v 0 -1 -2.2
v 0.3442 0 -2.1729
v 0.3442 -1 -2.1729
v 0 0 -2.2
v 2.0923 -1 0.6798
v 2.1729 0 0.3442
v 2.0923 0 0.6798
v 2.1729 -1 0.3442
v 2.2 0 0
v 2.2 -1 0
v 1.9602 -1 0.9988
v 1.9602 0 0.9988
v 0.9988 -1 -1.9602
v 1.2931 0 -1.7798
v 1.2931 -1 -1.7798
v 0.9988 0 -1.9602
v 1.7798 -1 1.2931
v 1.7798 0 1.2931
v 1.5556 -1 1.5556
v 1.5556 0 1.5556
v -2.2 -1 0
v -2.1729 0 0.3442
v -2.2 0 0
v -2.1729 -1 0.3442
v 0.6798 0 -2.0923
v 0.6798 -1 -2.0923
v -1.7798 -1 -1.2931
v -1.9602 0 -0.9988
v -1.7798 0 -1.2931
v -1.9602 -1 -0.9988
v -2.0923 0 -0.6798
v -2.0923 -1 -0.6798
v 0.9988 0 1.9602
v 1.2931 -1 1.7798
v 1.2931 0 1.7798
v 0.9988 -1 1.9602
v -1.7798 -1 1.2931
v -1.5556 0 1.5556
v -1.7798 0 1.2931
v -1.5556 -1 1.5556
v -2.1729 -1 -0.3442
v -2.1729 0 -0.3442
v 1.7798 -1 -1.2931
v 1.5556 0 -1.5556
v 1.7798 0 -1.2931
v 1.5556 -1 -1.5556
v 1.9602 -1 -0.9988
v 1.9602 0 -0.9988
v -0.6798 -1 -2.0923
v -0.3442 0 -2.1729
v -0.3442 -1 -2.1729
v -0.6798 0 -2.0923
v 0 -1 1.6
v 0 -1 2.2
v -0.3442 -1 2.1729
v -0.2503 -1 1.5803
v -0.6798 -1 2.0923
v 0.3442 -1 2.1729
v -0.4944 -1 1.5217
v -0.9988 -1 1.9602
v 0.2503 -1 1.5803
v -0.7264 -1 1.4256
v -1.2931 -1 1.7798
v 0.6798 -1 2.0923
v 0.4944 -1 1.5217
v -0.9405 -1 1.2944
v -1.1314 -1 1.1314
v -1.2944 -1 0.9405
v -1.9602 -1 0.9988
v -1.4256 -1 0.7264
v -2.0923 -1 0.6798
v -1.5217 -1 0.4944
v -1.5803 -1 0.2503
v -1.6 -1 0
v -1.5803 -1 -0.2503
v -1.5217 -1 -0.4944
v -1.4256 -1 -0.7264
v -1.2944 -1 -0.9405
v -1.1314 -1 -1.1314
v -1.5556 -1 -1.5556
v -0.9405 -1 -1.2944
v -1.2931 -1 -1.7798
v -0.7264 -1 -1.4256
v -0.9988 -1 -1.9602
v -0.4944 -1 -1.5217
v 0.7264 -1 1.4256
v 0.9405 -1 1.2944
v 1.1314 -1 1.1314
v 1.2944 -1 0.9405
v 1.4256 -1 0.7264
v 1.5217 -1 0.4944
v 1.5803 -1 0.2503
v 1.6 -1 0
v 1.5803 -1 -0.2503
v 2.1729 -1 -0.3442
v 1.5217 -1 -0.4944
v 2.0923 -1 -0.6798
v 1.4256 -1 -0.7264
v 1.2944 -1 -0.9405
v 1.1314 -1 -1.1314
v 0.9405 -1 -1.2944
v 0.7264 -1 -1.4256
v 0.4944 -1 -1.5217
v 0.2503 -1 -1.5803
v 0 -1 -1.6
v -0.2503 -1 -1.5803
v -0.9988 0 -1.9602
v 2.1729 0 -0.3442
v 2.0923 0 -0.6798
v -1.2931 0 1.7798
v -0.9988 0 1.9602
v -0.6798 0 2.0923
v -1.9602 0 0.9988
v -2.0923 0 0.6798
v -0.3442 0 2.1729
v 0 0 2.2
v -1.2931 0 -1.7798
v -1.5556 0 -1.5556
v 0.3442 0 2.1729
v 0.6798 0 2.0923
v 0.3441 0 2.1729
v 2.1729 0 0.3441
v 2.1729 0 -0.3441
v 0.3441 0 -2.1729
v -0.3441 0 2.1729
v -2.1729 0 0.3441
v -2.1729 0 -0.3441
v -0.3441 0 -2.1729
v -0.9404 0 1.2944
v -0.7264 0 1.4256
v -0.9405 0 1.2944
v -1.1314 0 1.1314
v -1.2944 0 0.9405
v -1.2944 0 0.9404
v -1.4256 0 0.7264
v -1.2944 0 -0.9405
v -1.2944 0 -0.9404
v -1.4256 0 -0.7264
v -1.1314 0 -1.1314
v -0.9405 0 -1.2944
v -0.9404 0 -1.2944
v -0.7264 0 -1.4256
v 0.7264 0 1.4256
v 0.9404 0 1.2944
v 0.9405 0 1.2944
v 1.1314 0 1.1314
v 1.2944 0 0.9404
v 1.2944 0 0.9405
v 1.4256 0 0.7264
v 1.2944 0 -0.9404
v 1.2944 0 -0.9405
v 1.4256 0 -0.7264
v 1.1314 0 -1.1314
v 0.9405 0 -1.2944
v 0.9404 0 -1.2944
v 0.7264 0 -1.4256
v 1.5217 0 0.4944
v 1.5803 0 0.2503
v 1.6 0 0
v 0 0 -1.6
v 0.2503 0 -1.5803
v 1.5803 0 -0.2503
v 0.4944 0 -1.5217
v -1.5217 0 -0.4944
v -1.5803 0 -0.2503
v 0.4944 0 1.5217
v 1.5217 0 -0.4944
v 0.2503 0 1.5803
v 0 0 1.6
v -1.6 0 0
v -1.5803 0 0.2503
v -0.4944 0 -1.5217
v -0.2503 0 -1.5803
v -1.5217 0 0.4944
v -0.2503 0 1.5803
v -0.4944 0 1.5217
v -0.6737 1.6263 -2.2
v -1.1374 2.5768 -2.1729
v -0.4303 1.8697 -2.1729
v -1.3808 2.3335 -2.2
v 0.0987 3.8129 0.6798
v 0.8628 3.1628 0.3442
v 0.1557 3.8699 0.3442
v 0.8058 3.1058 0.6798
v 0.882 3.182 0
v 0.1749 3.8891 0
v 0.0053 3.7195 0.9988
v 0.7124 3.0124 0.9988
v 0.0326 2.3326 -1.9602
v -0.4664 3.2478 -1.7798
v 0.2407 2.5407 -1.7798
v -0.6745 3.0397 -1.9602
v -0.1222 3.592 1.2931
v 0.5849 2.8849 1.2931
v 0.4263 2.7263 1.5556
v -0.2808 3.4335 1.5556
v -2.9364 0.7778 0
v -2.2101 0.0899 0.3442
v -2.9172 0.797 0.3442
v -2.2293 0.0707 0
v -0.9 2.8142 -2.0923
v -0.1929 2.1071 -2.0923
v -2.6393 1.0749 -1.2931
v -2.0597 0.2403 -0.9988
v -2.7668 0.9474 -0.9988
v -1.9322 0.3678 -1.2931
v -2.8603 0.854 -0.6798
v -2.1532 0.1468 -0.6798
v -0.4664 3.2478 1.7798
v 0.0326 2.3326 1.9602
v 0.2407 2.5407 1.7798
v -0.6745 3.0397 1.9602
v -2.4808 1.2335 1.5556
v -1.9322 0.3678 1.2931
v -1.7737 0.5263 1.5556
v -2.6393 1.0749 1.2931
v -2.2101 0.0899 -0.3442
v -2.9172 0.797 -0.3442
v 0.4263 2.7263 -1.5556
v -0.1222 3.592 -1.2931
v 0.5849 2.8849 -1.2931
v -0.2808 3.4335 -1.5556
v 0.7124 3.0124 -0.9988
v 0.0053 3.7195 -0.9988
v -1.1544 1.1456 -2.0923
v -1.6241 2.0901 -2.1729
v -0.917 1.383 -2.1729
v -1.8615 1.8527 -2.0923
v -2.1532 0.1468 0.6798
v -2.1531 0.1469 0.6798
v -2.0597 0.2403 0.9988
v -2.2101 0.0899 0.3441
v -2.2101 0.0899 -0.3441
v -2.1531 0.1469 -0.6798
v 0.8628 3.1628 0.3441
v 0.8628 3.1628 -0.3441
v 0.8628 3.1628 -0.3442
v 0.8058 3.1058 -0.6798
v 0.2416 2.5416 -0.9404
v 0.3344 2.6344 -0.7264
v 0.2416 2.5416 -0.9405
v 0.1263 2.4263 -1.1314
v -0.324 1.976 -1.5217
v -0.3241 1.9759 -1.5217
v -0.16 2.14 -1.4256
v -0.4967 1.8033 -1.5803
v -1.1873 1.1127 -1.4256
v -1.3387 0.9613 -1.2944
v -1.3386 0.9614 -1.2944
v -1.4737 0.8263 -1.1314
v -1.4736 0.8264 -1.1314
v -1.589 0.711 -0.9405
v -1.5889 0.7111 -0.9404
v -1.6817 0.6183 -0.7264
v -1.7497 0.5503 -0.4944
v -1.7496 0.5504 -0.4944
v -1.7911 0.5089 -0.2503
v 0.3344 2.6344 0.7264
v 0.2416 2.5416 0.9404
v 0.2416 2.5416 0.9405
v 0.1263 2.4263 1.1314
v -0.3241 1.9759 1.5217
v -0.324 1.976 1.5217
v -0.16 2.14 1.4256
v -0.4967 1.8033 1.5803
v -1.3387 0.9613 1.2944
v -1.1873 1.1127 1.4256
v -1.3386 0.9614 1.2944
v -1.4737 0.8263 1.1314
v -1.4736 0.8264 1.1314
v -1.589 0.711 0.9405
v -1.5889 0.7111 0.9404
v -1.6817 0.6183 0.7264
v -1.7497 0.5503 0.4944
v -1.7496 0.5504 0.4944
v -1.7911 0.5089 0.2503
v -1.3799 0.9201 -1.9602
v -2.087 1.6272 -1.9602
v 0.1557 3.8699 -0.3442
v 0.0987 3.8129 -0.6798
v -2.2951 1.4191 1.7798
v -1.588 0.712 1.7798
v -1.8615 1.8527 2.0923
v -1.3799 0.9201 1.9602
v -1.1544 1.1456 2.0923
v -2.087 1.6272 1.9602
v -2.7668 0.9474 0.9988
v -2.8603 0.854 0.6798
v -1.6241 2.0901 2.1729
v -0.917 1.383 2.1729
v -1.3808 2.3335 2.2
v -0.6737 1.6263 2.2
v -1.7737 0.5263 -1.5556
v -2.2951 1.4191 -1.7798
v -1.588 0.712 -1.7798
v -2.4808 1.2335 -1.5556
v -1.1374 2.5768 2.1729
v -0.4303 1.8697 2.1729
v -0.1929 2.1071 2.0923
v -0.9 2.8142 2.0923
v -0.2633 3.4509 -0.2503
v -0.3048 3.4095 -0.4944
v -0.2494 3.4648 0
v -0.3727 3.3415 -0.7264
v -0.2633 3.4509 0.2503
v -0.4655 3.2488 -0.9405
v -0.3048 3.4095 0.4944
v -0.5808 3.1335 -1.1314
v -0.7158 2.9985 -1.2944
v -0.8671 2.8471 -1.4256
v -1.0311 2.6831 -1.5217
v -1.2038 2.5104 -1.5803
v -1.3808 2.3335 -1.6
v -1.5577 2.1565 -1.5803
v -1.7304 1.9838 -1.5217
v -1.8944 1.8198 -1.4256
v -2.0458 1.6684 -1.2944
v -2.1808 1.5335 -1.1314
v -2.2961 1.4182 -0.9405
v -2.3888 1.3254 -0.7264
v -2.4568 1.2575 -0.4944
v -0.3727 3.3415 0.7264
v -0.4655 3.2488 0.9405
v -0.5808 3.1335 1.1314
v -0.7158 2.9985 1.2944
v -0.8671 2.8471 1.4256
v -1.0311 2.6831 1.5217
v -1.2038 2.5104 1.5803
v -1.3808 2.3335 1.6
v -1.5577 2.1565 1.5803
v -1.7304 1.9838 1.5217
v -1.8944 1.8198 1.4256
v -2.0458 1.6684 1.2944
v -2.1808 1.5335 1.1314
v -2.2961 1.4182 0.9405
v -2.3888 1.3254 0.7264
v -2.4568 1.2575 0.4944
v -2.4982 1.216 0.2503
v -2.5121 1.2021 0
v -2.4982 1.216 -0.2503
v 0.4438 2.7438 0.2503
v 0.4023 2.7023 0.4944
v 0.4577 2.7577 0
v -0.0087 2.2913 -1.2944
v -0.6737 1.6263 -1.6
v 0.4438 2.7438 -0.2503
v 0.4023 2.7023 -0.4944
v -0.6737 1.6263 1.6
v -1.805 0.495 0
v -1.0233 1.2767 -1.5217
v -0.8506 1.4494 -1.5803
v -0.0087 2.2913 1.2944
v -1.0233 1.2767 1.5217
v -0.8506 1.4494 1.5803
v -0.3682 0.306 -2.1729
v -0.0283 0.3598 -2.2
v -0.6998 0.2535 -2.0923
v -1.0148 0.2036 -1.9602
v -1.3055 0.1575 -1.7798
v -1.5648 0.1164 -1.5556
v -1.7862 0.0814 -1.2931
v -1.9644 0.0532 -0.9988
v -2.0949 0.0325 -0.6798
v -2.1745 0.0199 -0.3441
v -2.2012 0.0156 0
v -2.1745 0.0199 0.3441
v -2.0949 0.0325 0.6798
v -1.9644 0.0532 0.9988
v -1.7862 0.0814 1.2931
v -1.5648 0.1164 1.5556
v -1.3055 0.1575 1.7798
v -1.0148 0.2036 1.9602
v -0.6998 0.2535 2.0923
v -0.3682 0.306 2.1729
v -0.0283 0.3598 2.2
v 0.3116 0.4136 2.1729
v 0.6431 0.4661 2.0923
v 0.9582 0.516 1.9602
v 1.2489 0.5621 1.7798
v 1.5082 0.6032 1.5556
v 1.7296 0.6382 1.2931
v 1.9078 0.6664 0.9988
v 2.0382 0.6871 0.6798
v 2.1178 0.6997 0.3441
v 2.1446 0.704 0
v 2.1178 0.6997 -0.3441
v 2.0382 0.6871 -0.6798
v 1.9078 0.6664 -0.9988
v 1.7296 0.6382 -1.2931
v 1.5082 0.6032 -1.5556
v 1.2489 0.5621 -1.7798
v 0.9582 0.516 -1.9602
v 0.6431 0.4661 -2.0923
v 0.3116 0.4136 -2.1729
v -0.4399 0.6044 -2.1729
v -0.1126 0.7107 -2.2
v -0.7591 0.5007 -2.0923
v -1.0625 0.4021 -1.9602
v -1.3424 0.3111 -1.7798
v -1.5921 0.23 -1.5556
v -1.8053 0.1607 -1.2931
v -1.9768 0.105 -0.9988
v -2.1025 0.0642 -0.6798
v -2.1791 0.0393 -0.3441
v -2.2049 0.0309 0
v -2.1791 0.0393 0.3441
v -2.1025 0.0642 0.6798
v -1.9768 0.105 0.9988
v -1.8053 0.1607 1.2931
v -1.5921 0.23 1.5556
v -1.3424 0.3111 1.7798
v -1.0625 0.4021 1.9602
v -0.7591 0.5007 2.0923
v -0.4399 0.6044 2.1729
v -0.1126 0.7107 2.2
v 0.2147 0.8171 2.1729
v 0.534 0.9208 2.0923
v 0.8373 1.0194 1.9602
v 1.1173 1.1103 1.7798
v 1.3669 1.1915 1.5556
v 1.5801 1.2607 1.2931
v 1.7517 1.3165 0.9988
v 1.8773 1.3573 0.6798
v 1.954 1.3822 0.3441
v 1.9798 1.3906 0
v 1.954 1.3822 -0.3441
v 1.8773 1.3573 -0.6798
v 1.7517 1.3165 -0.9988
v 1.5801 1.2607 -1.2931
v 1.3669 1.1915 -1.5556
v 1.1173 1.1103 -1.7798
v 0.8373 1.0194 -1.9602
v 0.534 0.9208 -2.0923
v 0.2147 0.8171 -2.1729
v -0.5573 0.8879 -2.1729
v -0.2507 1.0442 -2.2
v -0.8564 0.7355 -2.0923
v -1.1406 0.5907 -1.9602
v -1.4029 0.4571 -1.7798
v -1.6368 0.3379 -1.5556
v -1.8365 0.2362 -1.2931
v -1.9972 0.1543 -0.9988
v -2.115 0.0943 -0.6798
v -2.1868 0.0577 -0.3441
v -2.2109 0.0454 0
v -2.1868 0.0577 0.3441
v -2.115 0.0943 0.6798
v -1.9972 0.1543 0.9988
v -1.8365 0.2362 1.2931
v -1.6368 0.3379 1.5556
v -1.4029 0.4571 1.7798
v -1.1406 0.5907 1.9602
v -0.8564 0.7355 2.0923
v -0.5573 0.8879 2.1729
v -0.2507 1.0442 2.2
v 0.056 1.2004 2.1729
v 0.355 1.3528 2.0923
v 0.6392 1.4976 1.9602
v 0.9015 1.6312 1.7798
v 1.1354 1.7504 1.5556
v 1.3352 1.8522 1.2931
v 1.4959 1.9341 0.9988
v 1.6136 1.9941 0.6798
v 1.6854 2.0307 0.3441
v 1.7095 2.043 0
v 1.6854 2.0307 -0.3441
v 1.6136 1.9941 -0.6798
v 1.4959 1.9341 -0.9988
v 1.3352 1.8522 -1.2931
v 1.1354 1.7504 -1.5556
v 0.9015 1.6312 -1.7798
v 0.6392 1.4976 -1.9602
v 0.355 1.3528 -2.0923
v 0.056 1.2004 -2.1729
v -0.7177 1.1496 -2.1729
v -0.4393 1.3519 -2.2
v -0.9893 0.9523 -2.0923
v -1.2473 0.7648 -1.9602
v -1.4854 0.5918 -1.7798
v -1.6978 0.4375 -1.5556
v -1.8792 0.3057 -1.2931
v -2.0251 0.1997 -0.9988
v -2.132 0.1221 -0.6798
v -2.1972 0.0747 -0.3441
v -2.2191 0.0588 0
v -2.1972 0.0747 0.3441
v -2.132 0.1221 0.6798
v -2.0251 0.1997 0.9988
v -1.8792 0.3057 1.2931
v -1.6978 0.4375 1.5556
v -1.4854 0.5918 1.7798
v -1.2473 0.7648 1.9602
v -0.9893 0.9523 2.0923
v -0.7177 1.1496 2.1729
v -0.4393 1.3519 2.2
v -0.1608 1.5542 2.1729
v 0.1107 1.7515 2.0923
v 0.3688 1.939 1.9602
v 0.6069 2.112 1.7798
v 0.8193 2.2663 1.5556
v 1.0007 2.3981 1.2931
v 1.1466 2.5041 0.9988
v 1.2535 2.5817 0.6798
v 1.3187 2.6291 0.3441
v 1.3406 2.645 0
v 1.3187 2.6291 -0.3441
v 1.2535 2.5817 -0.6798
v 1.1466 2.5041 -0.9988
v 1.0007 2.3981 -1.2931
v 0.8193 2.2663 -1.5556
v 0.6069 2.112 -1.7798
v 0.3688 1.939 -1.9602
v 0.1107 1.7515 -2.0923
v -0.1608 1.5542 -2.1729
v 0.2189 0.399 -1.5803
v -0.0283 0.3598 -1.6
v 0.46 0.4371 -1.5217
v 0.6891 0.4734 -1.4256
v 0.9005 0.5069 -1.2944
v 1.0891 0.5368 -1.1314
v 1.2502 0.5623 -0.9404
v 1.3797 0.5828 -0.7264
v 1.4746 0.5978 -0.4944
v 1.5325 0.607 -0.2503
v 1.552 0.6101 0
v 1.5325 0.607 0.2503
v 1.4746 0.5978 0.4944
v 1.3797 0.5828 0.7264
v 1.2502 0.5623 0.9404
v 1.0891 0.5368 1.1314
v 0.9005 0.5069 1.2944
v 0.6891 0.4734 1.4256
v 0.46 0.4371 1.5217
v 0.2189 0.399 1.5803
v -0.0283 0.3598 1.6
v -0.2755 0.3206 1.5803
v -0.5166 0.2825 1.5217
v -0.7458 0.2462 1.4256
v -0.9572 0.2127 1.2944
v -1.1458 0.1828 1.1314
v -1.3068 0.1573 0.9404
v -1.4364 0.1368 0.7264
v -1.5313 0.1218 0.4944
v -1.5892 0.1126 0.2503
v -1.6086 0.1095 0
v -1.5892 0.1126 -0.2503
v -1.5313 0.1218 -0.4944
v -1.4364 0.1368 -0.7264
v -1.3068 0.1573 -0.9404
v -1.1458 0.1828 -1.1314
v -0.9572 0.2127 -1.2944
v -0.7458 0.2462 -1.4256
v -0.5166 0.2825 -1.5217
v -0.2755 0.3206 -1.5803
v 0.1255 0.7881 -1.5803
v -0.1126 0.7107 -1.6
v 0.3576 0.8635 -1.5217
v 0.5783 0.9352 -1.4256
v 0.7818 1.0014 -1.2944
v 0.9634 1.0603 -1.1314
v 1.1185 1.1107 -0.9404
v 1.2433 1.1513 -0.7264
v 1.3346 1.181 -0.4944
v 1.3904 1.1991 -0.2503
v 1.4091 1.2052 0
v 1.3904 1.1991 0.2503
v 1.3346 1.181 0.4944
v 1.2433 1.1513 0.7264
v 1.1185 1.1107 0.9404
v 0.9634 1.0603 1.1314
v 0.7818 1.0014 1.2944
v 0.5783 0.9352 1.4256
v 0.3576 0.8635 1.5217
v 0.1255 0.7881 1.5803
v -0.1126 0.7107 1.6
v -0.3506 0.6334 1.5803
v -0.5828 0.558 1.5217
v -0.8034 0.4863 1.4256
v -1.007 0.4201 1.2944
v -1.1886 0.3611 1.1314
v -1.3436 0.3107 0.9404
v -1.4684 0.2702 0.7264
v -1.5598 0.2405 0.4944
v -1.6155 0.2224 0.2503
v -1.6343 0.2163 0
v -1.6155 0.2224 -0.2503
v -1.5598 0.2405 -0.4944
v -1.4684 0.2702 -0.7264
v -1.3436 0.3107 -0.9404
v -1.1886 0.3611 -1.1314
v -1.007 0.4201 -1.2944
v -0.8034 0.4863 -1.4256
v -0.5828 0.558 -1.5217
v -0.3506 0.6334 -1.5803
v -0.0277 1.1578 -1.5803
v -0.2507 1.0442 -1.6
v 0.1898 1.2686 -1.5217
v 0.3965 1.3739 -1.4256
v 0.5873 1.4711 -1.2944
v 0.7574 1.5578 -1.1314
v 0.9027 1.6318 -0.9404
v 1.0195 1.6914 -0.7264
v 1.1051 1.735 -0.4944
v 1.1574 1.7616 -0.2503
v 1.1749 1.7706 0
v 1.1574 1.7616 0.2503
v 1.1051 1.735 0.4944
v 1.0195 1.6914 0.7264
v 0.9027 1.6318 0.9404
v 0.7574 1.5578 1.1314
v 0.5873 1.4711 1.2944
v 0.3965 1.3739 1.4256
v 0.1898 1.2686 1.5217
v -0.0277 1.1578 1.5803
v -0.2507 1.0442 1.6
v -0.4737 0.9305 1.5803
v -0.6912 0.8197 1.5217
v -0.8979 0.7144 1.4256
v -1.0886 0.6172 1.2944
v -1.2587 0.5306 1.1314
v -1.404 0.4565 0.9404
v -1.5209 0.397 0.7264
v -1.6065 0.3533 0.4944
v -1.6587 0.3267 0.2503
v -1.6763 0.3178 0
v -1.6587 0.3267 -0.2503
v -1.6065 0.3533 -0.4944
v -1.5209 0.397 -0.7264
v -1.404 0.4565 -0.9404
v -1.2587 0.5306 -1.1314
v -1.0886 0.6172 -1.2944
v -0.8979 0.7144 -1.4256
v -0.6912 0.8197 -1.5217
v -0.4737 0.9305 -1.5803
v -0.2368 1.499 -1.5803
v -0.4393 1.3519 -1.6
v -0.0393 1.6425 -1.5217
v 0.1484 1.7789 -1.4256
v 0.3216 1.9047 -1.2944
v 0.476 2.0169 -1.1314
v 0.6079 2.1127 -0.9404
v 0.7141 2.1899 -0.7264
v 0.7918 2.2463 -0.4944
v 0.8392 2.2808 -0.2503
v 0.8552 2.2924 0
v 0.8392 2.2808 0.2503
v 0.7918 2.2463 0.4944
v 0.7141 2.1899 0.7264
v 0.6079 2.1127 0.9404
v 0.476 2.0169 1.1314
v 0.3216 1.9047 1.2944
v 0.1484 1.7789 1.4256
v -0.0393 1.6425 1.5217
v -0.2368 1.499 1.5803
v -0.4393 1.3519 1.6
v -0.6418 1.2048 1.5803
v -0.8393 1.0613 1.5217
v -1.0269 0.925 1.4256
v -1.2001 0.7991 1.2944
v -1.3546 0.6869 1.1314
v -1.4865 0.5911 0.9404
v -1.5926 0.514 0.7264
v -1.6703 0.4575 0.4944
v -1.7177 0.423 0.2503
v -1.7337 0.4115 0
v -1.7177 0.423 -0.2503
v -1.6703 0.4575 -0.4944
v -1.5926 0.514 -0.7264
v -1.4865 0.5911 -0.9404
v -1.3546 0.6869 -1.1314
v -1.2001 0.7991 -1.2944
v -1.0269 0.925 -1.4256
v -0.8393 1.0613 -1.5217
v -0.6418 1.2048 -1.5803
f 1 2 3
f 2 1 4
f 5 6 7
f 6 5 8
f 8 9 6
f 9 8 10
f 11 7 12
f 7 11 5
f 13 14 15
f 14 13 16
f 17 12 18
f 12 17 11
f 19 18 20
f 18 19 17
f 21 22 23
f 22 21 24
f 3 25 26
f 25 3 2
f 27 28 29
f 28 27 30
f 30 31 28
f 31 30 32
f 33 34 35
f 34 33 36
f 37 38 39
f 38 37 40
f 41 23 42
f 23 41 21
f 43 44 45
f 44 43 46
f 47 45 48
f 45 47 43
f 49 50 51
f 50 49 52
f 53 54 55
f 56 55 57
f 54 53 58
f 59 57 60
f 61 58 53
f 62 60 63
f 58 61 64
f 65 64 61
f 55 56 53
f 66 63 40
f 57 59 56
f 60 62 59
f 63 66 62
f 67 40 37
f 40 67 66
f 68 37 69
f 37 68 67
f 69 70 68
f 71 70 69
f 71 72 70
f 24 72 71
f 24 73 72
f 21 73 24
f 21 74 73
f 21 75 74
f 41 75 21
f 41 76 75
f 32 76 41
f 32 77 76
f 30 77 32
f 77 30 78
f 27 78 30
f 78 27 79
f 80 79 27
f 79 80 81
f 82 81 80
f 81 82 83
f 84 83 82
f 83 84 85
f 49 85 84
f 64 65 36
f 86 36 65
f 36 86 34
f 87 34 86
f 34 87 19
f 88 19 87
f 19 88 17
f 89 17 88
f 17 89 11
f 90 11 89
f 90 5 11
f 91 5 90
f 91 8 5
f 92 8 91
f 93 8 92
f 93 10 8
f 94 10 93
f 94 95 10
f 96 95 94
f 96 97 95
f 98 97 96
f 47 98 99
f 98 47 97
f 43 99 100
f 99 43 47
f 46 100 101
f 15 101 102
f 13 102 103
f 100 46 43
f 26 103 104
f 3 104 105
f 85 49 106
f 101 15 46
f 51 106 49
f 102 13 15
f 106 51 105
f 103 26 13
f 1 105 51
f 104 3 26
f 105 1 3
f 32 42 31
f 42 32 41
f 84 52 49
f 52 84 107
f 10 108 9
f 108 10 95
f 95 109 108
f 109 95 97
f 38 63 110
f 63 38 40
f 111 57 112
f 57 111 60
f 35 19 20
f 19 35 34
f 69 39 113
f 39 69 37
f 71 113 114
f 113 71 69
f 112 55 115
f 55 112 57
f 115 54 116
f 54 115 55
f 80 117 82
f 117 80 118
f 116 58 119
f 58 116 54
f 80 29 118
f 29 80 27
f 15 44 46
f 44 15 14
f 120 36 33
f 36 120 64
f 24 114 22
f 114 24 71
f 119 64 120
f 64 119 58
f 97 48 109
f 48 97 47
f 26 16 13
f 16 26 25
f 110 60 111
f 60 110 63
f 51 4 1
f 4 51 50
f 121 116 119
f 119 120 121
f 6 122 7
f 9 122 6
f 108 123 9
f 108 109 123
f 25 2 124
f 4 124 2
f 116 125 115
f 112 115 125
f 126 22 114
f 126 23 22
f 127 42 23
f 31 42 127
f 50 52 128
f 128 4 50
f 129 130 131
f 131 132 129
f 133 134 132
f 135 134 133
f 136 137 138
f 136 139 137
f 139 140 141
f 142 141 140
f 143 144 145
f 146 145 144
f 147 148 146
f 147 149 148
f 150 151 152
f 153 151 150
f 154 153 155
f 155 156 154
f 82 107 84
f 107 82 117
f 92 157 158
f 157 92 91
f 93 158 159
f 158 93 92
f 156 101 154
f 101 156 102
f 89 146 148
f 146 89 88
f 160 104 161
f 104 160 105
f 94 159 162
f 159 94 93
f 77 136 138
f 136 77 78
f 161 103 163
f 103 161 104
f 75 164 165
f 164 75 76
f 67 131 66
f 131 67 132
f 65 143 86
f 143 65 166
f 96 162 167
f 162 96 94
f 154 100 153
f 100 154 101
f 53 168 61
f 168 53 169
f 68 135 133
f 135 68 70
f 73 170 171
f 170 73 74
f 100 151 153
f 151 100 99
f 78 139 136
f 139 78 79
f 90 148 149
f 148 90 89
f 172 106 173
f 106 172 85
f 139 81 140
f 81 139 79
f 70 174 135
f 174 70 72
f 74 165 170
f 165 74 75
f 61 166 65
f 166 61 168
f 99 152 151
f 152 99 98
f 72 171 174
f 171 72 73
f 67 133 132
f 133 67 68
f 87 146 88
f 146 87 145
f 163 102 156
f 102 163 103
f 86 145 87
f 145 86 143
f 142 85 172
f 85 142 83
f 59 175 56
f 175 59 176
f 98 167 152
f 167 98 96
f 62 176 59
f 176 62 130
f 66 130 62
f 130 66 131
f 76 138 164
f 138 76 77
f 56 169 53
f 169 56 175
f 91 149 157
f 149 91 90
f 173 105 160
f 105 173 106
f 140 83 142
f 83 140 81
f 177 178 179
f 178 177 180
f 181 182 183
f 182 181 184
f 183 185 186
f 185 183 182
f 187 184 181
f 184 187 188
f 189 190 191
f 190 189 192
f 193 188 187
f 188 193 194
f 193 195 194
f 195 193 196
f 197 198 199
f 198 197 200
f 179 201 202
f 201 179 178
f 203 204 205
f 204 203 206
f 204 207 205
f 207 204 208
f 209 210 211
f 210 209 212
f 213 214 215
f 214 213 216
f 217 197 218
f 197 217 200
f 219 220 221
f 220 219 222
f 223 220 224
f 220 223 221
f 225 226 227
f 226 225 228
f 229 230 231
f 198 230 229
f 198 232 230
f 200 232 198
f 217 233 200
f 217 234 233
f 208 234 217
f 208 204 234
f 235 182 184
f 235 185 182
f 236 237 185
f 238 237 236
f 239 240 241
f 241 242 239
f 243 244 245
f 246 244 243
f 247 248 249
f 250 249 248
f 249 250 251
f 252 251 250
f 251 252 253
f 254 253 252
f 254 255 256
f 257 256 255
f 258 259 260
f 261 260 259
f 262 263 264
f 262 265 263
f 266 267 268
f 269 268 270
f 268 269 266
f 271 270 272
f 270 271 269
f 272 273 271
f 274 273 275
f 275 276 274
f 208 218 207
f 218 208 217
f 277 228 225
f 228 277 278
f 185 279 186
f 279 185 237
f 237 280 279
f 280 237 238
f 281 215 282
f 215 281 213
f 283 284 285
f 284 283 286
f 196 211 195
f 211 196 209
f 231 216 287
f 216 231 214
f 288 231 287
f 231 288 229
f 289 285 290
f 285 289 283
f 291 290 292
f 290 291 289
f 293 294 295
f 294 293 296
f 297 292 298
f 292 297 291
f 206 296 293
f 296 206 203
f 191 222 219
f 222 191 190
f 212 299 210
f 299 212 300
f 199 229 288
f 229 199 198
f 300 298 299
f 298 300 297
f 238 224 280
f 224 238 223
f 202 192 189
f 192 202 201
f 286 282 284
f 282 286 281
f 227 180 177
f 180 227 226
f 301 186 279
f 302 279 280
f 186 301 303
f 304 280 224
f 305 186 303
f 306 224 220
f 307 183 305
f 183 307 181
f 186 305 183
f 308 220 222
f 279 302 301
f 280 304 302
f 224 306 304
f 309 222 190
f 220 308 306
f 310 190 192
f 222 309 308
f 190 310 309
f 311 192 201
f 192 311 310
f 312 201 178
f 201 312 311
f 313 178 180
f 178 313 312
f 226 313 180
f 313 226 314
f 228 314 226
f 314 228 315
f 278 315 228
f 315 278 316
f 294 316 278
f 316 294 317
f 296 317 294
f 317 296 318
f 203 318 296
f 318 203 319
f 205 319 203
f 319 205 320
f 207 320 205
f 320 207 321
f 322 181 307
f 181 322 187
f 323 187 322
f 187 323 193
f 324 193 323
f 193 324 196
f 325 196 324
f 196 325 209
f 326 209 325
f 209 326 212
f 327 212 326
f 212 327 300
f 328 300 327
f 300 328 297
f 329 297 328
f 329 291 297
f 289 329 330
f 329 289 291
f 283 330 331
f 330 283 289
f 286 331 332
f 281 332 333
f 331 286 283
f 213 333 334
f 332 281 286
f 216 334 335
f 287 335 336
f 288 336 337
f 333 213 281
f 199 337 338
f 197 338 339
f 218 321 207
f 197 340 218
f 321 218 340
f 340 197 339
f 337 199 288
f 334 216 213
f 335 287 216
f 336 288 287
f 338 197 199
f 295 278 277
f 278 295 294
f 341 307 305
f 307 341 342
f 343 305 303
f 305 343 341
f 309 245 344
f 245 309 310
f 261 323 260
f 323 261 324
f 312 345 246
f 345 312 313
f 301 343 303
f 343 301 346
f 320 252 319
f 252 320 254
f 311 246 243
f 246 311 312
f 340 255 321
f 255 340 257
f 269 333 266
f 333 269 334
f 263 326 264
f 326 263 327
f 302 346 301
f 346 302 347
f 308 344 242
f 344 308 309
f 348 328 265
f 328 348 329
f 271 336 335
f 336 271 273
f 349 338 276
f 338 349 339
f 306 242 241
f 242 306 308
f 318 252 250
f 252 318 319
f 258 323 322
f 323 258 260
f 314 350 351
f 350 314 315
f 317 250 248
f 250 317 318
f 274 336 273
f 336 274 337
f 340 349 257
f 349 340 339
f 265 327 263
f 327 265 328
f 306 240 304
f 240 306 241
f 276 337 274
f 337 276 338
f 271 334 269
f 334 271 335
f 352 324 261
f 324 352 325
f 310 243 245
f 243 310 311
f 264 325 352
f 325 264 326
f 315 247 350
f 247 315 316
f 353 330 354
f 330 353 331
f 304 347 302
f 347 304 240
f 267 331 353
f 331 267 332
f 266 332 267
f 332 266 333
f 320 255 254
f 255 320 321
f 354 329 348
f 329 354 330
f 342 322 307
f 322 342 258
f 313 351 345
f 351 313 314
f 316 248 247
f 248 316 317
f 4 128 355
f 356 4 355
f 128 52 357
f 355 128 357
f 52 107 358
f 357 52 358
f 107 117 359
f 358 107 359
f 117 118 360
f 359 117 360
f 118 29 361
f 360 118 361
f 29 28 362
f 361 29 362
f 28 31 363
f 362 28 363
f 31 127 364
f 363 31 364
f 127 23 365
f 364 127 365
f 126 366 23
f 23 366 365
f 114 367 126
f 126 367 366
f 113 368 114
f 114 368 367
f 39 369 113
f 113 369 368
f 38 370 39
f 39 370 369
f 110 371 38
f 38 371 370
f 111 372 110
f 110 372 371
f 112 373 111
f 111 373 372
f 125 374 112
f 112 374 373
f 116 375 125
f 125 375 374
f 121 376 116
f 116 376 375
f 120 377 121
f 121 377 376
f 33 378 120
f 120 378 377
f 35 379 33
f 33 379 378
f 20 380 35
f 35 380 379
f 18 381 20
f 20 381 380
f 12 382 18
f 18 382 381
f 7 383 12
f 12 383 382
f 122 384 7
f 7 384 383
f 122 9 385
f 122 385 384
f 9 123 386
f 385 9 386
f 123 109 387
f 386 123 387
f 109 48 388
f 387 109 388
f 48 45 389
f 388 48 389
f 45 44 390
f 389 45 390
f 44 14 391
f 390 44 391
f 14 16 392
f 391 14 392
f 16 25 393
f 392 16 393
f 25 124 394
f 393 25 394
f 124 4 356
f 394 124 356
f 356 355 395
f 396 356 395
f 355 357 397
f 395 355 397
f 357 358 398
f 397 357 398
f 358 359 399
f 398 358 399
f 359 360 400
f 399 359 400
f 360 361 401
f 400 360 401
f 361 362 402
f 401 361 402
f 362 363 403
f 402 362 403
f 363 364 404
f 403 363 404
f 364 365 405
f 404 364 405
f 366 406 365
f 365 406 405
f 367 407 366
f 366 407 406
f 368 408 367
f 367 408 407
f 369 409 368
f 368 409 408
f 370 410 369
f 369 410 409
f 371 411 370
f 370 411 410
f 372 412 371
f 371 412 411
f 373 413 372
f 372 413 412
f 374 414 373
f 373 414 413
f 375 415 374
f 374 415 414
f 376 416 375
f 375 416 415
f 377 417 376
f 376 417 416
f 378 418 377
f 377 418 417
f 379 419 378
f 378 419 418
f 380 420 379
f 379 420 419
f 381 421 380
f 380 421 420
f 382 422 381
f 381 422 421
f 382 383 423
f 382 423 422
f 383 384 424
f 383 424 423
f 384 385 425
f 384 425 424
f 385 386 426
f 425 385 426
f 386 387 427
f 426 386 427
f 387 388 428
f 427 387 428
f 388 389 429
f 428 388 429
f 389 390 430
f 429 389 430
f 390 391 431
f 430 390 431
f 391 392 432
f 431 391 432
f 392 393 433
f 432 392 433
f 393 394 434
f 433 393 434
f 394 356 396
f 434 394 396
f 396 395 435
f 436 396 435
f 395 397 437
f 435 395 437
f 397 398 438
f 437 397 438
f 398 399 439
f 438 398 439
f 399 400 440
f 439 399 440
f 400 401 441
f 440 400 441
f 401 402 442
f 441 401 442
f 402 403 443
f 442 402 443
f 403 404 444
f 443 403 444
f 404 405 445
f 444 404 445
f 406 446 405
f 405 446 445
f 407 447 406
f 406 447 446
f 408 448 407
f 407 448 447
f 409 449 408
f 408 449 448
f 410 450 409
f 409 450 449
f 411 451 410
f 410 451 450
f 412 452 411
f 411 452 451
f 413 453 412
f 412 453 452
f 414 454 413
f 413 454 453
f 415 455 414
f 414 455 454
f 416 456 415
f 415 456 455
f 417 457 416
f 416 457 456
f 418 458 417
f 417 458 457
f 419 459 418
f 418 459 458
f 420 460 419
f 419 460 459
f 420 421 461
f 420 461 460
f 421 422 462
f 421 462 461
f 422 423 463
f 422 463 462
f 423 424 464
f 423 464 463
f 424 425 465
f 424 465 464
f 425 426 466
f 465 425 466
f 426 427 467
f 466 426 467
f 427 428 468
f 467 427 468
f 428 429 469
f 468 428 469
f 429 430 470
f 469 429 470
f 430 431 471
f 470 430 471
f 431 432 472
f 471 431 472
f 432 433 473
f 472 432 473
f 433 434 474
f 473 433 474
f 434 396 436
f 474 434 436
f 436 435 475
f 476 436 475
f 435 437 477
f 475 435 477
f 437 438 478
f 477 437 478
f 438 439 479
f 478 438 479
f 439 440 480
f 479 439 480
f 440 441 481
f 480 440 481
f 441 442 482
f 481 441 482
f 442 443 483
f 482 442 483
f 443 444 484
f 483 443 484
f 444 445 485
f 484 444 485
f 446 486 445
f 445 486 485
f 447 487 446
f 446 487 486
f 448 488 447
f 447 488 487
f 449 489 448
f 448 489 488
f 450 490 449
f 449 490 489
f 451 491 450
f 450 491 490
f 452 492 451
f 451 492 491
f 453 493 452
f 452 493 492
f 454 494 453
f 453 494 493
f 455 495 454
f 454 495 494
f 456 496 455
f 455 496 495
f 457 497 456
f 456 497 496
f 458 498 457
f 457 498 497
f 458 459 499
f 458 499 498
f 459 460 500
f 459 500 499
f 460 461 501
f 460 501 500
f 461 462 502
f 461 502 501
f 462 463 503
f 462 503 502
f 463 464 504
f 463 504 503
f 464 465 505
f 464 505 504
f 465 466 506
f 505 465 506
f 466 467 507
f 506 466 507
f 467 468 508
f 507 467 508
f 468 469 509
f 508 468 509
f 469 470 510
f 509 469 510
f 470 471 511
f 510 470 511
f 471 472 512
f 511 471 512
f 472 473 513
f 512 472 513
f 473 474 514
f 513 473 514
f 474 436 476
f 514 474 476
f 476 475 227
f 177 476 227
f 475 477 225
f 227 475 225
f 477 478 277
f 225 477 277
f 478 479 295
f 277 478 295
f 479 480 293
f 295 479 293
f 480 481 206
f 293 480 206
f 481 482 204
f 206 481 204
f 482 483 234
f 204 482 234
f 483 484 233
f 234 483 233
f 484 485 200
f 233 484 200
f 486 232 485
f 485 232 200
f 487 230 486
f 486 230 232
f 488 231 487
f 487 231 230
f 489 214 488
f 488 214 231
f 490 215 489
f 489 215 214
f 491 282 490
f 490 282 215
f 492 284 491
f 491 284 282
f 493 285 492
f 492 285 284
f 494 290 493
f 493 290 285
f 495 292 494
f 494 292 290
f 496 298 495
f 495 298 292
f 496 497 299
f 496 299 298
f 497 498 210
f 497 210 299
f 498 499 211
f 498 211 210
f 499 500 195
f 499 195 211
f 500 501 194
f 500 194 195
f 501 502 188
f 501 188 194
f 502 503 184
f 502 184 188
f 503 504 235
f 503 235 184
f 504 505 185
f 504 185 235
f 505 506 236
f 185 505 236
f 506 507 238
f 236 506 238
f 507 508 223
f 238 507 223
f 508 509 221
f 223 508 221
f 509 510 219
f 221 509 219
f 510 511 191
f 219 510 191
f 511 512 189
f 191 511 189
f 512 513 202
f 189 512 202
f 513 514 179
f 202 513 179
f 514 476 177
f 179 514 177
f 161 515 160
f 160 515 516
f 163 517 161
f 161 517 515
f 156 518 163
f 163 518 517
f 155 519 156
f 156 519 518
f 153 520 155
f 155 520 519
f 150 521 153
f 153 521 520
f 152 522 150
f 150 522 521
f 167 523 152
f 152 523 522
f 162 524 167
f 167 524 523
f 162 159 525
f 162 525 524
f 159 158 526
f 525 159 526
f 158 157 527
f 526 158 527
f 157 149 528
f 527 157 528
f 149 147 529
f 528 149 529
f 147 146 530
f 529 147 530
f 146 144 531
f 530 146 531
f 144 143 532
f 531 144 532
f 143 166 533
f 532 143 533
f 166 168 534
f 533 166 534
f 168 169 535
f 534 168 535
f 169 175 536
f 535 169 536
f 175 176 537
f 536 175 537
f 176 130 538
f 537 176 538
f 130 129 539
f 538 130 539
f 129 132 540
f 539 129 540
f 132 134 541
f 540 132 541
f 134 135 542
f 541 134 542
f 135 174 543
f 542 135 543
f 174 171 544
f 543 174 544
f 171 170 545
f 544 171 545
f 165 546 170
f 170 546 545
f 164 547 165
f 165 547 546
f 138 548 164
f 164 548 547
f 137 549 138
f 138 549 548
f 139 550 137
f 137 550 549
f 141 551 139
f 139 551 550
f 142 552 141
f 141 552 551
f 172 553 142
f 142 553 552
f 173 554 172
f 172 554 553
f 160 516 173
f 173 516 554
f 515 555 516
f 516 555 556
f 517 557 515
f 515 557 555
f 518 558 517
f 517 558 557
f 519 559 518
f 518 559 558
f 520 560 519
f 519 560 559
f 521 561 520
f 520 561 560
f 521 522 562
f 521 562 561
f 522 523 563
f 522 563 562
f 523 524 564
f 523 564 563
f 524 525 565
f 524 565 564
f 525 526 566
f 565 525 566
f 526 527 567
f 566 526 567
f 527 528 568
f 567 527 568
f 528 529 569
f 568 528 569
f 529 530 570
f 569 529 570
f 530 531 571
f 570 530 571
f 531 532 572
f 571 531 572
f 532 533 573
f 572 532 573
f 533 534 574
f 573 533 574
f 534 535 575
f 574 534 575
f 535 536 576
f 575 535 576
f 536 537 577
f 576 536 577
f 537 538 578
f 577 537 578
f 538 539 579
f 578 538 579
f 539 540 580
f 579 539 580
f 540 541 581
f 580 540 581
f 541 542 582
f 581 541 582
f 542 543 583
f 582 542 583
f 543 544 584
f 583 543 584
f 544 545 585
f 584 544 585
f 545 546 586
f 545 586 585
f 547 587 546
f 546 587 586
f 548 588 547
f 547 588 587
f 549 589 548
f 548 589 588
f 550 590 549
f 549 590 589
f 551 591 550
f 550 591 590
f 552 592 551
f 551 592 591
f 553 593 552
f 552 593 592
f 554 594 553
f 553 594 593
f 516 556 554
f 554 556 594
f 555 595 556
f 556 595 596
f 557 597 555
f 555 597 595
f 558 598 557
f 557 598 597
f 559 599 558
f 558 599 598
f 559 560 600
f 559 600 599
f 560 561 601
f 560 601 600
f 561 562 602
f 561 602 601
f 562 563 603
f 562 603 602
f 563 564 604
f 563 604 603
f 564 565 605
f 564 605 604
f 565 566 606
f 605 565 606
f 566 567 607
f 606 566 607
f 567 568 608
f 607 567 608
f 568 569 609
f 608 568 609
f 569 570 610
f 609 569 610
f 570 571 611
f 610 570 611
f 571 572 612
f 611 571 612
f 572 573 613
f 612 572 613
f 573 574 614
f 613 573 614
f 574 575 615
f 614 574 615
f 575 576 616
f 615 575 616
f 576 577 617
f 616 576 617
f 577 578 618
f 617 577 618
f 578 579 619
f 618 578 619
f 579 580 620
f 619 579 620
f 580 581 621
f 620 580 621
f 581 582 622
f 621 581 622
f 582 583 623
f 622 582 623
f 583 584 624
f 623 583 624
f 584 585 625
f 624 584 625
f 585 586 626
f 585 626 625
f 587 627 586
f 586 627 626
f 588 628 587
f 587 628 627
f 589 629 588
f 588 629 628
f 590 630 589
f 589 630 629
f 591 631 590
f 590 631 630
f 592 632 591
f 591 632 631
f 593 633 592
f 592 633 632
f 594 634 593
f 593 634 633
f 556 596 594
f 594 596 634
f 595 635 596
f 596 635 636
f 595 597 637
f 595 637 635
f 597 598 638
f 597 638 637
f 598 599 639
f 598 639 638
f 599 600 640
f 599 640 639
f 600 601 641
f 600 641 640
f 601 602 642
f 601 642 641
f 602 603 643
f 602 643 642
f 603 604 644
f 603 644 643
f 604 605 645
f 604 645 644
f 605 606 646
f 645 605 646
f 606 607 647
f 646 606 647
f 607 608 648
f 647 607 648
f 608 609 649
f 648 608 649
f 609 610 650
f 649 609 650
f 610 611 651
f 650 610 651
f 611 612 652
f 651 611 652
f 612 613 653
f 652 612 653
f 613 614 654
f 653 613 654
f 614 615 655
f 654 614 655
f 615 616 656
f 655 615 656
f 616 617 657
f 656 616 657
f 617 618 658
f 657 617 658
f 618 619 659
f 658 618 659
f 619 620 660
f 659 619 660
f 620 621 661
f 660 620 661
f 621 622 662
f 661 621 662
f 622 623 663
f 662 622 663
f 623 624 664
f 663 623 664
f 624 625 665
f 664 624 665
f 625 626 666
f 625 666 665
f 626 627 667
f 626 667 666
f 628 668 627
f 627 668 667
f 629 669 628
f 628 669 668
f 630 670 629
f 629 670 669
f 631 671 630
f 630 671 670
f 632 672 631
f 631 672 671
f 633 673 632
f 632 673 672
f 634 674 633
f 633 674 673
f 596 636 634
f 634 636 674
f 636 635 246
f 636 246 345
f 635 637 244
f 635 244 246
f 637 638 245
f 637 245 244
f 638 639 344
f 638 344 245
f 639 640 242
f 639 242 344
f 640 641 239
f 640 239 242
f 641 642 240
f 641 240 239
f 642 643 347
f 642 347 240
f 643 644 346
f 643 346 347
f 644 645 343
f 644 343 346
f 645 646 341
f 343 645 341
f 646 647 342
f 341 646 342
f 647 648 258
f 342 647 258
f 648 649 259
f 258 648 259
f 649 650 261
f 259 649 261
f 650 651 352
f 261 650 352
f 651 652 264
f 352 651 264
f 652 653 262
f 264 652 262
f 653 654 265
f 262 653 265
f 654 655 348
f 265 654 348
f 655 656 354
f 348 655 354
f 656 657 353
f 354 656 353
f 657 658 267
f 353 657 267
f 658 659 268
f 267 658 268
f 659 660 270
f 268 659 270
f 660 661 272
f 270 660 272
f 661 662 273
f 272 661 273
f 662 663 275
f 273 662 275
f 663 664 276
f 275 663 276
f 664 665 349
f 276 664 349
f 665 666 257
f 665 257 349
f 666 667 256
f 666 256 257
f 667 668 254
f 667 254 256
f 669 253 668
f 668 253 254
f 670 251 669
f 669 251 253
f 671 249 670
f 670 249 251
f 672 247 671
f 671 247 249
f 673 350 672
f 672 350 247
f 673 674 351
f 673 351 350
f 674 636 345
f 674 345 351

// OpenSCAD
module pipeangle(
    angle = 45, 
    pipe_d = 2 * 2.54, 
    end_cap_d = 2.3 * 2.54,
    end_cap_l = 3,
    curve_r = 10,
    pipe_t = 0.5)
{
    translate([-curve_r, 0,0]) {
        rotate_extrude(angle=angle, $fn = 40)
        translate([curve_r,0,0])
        difference() {
            circle(d = pipe_d); 
            circle(d = pipe_d-2*pipe_t); 
        }
        
        endcap(end_cap_d, end_cap_l, pipe_t, curve_r, false);
        
        rotate([0,0,angle])
        endcap(end_cap_d, end_cap_l, pipe_t, curve_r, true);
    }
}

module endcap(
    end_cap_d = 2.5 * 2.54,
    end_cap_l = 3,
    pipe_t = 0.5,
    curve_r = 10,
    other_end=false)
{
    translate([curve_r, other_end ? end_cap_l : 0, 0])
    rotate([90,0,0])
    difference() {
        cylinder(d = end_cap_d, 
            h = end_cap_l, $fn = 40);
        
        translate([0,0,-0.1])
        cylinder(d = end_cap_d-2*pipe_t, 
            h = end_cap_l+0.2, $fn = 40);
    }
}

module ppr90()
{
    pipeangle(angle = 90, 
        pipe_d = 4.4, 
        end_cap_d = 4.4,
        end_cap_l = 1,
        curve_r = 2.3,
        pipe_t = 0.6);
}

module ppr45()
{
    pipeangle(angle = 45, 
        pipe_d = 4.4, 
        end_cap_d = 4.4,
        end_cap_l = 1,
        curve_r = 2.3,
        pipe_t = 0.6);
}

// For testing
//pipeangle(angle = 45);
//ppr90();
ppr45();
